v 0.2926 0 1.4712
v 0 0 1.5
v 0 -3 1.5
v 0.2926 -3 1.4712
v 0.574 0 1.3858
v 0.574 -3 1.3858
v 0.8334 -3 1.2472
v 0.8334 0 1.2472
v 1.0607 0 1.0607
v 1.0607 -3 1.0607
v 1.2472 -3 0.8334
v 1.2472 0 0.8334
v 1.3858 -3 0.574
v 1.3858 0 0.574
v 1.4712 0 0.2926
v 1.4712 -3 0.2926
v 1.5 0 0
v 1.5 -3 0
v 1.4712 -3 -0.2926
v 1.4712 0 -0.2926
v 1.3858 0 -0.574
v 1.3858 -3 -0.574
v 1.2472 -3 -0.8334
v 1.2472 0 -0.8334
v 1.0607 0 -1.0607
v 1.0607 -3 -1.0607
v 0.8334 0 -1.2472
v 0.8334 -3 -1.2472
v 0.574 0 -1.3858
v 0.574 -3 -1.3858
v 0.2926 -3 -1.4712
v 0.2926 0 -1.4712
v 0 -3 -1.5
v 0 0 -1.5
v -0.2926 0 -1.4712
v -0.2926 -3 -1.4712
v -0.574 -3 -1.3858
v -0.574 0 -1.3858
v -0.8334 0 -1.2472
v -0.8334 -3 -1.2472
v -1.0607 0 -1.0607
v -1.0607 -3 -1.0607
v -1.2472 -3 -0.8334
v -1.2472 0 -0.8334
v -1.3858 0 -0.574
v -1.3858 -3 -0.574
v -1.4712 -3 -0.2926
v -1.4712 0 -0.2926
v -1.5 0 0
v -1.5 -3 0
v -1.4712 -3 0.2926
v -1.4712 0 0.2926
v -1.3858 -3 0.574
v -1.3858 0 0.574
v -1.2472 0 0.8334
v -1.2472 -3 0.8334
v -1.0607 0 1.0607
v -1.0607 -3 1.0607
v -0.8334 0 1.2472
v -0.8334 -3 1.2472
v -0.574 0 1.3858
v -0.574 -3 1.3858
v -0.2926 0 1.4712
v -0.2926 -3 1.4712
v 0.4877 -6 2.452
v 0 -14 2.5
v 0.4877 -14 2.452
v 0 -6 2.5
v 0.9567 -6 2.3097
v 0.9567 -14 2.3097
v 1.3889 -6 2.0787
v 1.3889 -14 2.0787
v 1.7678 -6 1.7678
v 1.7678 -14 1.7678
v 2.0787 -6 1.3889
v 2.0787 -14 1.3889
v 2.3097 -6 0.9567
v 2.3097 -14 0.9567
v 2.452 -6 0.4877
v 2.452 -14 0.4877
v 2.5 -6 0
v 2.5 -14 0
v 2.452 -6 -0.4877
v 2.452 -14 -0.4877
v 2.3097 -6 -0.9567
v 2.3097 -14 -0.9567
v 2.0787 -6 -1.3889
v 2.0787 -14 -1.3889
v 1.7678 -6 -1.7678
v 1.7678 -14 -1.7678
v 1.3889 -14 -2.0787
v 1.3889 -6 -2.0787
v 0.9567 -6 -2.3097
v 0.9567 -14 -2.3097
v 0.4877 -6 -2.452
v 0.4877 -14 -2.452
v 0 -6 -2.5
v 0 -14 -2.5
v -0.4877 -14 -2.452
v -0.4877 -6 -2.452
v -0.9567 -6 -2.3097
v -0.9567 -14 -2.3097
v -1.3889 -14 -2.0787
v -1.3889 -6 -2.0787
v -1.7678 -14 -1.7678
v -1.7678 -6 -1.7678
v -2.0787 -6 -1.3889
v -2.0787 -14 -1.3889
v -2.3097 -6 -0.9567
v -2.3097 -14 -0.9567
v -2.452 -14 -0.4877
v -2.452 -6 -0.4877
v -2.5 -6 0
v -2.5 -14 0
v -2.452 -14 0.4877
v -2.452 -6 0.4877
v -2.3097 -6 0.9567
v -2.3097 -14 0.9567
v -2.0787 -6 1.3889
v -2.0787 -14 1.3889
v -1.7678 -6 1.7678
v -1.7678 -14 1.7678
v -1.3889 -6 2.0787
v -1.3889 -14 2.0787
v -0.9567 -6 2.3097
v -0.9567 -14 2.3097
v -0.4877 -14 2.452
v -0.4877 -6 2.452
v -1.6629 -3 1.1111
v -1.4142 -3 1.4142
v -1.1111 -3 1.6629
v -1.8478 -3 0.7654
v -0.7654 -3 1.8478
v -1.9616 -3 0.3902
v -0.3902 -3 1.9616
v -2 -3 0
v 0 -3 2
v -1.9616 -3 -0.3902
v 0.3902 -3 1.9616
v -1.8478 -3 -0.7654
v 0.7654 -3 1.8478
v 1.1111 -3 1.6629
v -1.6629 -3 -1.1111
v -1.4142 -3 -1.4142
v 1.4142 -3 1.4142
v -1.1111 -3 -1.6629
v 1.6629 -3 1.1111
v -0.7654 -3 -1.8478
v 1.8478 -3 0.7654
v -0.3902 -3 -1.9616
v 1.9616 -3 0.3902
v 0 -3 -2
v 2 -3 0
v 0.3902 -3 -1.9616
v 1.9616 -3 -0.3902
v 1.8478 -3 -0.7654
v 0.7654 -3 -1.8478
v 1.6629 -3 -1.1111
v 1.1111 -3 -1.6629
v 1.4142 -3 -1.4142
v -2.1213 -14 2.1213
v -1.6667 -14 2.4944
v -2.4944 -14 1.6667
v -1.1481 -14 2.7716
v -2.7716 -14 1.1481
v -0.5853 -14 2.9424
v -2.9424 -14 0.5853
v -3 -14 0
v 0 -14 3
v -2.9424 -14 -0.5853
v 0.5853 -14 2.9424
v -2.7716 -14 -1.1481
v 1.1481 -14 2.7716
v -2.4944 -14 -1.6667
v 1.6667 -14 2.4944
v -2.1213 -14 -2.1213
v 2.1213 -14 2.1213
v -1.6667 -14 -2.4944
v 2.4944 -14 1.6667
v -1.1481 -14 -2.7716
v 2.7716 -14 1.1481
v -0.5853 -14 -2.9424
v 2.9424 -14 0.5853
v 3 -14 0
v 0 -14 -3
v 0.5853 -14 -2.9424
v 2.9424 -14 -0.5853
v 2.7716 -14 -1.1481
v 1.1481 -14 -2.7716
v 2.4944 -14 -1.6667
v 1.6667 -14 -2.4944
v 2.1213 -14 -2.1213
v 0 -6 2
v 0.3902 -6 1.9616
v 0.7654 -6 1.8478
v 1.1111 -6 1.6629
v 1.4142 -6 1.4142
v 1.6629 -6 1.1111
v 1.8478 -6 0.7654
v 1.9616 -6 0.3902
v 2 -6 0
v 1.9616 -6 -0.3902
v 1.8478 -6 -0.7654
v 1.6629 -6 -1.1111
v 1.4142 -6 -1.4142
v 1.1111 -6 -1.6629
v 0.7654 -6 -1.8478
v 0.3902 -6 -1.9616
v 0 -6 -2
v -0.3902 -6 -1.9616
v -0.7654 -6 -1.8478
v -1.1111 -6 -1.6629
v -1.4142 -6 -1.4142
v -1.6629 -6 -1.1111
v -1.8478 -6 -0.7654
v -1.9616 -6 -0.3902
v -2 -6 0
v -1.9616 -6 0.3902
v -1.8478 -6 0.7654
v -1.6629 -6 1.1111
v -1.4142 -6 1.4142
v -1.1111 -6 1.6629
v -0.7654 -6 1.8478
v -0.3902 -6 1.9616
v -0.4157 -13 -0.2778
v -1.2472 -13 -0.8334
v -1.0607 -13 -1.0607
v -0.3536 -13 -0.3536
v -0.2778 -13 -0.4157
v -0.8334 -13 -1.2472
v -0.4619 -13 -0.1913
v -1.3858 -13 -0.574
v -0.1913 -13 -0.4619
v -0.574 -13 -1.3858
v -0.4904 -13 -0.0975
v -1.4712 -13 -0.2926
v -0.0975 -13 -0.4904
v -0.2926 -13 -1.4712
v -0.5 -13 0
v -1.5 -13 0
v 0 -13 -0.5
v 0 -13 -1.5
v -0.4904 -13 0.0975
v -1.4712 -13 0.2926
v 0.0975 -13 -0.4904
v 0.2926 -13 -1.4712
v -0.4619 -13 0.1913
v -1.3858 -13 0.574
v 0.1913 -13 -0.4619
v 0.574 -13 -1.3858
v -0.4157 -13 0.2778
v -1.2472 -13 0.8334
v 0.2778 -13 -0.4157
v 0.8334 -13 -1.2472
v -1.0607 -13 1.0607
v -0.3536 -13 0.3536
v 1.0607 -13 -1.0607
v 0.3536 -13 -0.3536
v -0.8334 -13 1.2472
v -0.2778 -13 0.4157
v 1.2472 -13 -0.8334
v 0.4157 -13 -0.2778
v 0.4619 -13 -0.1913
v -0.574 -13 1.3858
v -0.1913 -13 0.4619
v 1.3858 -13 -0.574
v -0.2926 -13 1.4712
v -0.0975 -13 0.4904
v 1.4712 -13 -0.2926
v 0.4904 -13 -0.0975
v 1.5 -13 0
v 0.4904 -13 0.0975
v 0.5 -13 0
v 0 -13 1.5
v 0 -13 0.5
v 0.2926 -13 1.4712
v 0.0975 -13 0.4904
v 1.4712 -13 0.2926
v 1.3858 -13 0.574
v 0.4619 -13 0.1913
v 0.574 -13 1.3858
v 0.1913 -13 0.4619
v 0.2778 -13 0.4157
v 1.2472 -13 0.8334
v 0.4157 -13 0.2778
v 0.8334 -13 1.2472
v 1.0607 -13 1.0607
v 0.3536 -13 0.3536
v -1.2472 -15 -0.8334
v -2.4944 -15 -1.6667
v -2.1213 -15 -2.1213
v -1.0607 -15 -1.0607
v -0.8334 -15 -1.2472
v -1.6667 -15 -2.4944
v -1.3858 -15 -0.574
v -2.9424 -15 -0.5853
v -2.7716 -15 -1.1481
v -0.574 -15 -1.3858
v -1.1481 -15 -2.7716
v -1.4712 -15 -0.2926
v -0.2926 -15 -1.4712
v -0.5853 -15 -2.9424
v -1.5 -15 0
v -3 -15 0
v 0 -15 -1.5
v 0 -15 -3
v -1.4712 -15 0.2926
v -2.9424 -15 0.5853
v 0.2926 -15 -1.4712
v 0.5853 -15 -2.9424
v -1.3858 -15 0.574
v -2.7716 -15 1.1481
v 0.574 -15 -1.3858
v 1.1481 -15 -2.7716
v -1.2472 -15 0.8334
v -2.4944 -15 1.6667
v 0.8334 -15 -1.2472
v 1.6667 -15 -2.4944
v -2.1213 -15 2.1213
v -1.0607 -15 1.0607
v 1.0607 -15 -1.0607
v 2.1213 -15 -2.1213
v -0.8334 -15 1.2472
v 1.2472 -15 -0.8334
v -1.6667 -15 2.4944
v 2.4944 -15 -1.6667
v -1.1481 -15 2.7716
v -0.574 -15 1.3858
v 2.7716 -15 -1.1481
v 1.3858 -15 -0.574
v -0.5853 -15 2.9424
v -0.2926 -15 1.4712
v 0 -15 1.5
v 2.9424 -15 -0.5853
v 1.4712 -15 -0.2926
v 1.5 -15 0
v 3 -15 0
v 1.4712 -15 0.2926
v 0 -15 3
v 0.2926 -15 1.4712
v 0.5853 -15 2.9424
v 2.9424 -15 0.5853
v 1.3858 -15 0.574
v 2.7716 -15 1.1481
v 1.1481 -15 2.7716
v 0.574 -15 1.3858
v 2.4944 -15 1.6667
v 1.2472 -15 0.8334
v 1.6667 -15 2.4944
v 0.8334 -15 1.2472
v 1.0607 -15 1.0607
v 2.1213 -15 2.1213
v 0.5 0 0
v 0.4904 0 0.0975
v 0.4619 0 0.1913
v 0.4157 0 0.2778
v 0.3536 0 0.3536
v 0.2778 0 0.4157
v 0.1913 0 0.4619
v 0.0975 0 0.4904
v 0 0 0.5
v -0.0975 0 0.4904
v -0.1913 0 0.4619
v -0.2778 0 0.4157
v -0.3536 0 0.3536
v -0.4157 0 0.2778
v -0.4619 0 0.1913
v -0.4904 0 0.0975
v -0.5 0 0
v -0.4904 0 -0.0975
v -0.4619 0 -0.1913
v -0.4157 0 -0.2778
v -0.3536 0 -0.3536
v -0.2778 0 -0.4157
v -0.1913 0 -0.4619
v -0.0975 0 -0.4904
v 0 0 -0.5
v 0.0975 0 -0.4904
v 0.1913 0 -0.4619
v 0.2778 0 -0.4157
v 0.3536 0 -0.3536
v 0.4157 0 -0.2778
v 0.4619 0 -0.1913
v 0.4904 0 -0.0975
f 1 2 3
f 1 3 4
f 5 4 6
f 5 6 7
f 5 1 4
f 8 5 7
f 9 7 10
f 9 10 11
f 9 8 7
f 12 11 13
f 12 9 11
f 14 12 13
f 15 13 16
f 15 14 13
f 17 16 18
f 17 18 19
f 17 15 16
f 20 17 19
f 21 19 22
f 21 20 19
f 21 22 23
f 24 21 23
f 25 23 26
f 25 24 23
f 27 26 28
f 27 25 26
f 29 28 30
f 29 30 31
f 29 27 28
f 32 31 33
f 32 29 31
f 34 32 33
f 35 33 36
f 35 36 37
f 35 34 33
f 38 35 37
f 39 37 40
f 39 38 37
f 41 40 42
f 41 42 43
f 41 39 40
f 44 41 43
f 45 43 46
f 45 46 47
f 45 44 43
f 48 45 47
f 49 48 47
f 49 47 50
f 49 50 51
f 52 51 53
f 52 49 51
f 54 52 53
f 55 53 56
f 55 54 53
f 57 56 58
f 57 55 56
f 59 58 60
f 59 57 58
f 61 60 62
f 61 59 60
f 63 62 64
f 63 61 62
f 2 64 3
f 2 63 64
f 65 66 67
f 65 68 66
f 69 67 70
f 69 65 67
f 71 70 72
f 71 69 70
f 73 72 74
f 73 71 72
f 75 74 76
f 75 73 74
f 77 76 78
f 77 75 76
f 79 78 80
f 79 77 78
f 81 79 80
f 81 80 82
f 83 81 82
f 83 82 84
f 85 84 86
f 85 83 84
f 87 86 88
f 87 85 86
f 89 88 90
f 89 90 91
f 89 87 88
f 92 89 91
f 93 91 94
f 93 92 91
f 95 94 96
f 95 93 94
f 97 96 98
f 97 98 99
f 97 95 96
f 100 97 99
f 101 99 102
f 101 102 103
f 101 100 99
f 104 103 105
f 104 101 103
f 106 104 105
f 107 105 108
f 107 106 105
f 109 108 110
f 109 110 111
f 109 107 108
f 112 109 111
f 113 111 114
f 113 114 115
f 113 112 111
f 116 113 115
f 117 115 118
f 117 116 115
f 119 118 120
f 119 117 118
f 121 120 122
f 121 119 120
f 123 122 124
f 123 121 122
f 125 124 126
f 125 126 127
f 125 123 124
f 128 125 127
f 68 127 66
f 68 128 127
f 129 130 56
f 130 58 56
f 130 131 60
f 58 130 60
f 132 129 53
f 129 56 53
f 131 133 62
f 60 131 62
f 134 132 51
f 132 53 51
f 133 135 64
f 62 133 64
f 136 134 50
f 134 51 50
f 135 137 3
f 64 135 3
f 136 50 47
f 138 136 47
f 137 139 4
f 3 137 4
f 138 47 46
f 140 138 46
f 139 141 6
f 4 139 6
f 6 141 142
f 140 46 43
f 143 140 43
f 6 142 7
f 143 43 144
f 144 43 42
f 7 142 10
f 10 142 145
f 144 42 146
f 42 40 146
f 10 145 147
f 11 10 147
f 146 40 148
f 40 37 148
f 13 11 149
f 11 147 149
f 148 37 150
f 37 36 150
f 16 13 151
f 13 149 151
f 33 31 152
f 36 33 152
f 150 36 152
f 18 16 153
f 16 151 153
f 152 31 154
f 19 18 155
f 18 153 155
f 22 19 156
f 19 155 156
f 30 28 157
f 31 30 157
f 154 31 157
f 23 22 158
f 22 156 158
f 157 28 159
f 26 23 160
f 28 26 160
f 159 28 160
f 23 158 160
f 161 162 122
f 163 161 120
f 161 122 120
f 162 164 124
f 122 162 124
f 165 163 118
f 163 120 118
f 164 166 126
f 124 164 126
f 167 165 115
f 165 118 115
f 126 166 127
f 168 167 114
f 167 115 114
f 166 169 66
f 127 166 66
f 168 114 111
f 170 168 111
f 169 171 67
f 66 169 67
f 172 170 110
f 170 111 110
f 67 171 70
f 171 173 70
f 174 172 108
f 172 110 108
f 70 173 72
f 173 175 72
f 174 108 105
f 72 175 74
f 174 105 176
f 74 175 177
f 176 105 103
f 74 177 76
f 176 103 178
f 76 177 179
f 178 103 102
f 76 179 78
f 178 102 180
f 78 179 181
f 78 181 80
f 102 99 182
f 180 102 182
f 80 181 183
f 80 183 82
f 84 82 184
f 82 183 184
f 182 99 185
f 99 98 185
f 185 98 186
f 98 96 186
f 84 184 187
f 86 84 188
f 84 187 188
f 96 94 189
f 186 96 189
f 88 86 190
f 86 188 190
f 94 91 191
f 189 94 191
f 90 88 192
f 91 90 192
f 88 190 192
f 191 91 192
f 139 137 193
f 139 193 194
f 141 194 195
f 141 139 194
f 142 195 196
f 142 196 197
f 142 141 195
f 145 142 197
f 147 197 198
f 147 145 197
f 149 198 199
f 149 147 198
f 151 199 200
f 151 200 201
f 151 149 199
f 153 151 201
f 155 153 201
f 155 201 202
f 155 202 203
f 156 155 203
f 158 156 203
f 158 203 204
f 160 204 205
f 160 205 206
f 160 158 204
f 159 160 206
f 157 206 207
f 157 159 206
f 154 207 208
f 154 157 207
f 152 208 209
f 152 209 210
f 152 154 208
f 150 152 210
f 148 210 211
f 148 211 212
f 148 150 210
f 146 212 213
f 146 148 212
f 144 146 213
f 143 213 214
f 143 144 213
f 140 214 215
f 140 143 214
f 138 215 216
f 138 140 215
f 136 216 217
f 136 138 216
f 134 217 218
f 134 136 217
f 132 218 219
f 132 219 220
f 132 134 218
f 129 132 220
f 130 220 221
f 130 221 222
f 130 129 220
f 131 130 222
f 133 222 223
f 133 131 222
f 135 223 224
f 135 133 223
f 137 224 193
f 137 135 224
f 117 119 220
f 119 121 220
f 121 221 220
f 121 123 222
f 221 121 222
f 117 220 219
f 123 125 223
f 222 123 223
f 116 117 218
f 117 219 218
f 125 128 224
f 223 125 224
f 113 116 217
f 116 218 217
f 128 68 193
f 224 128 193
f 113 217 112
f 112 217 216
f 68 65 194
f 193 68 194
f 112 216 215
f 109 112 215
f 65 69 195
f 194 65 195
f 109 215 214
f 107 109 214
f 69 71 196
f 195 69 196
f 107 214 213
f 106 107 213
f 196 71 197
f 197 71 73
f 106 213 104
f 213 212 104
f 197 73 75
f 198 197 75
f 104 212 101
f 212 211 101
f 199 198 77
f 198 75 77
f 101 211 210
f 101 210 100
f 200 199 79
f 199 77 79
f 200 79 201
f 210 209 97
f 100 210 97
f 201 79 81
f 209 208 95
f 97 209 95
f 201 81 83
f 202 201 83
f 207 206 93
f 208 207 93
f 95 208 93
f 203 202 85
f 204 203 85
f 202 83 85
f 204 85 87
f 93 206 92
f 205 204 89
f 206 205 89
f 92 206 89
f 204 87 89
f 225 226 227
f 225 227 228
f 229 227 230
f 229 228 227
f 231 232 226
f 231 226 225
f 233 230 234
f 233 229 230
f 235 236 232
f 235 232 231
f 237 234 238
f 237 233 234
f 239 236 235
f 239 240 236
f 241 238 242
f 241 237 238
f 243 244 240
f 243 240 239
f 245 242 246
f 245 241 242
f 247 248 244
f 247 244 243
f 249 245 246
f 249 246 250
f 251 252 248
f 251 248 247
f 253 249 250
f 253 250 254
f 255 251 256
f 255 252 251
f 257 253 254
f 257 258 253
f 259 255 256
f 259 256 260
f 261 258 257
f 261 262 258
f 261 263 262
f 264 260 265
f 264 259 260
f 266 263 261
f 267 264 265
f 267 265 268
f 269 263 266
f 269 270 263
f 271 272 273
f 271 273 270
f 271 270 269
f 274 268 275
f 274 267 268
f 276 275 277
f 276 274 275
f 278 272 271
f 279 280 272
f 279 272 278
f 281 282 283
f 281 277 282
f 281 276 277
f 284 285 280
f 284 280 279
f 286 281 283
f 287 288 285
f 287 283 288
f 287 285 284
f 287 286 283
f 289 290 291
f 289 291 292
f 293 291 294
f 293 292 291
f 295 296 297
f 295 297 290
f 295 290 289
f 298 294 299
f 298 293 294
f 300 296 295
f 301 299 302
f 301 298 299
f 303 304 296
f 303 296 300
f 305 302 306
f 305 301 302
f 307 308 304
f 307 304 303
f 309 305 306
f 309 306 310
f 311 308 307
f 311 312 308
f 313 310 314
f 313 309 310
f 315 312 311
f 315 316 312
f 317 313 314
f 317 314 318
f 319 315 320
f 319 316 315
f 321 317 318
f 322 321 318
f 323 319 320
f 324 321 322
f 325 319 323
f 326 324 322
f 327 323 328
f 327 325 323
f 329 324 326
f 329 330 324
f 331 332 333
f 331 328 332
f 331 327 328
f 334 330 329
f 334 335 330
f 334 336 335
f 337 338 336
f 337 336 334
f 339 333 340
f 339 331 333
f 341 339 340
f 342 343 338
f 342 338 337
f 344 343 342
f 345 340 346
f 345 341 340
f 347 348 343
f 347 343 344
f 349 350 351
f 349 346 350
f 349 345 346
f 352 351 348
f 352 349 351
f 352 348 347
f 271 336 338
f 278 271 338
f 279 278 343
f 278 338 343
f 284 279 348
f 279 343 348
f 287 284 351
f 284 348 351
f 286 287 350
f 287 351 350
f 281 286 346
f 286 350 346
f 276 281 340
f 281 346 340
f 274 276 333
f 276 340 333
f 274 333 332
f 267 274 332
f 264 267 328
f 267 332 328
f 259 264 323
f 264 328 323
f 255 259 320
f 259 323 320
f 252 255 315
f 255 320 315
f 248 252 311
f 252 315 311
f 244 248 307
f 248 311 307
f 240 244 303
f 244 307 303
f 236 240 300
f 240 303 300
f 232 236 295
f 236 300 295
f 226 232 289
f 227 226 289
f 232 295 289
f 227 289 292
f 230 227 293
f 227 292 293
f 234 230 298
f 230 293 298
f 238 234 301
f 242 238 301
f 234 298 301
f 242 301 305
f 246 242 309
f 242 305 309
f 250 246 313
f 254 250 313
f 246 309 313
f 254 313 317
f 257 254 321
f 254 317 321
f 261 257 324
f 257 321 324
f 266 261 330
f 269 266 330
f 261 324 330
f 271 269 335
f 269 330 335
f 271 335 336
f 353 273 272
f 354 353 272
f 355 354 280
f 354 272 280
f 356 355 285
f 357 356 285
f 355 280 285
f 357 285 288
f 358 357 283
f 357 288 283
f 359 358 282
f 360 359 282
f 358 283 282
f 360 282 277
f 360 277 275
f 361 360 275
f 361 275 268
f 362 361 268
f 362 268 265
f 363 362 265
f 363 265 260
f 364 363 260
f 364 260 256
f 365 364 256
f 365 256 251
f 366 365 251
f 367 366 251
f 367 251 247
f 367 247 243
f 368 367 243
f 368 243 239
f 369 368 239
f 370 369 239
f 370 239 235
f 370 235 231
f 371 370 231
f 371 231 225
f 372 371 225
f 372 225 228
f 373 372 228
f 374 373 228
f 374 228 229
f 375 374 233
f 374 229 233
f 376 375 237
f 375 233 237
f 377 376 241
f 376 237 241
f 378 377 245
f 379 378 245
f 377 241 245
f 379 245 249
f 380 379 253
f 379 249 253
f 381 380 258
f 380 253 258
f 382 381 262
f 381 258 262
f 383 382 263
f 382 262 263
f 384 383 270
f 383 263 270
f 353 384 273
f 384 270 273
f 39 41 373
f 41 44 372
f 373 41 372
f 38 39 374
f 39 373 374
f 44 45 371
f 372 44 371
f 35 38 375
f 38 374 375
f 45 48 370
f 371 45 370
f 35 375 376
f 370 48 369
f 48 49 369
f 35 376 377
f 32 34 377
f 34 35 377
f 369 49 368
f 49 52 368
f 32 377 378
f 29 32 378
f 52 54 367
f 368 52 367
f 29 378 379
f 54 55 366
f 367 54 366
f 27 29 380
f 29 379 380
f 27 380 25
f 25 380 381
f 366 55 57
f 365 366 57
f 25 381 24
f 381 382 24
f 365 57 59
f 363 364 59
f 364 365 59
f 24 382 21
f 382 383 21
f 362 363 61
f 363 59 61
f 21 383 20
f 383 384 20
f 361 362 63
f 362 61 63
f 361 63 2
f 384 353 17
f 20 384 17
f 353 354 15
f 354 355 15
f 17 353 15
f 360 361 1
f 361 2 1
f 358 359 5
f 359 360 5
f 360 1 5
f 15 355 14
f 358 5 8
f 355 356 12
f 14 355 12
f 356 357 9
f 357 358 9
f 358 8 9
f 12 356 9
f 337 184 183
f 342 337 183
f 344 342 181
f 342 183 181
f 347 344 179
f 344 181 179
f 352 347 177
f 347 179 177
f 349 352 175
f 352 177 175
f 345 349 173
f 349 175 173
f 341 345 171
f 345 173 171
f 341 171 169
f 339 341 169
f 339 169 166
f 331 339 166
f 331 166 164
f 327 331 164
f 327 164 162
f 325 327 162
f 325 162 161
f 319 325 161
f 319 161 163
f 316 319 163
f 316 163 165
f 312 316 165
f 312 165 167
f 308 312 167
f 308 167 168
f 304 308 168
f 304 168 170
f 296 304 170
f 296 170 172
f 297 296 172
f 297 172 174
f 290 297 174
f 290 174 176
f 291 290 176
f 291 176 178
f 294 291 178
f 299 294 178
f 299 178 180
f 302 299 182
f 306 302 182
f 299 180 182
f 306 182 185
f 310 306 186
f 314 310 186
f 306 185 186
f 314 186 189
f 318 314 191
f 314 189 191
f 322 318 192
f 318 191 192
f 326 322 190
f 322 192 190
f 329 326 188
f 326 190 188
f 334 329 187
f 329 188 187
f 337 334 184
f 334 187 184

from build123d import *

# Parameters (mm, degrees)
F0_R     = 3
F1_DEPTH = 15
F2_R     = 1.5
F3_DEPTH = 2
F4_W     = 5.878874
F4_H     = 2.213873
F6_R     = 0.5
F7_DEPTH = 13.001
F8_W     = 16.149964
F8_H     = 2.257945
F10_W    = 4.508098
F10_H    = 1.941308


with BuildPart() as f1:
    # F0 (on Front) → F1 (new body)
    with BuildSketch(Plane.XZ):
        Circle(F0_R)
    extrude(amount=F1_DEPTH)

    # F2 (on face) → F3 (cut)
    with BuildSketch(Plane.XZ.offset(15)):
        Circle(F2_R)
    extrude(amount=-F3_DEPTH, mode=Mode.SUBTRACT)

    # F4 (on Right) → F5 (revolve, cut)
    with BuildSketch(Plane.YZ):
        with Locations((-0.060563, 2.606936)):
            Rectangle(F4_W, F4_H)
    revolve(axis=Axis((0, -8.455116, 0), (0, 1, 0)), mode=Mode.SUBTRACT)

    # F6 (on face) → F7 (cut, through all)
    with BuildSketch(Plane.XZ.offset(13)):
        Circle(F6_R)
    extrude(amount=-F7_DEPTH, mode=Mode.SUBTRACT)

    # F8 (on Right) → F9 (revolve, cut)
    with BuildSketch(Plane.YZ):
        with Locations((-5.925018, 3.628972)):
            Rectangle(F8_W, F8_H)
    revolve(axis=Axis((0, -7.437502, 0), (0, 1, 0)), mode=Mode.SUBTRACT)

    # F10 (on Right) → F11 (revolve, cut)
    with BuildSketch(Plane.YZ):
        with Locations((-3.745951, 2.970654)):
            Rectangle(F10_W, F10_H)
    revolve(axis=Axis((0, -6.562206, 0), (0, 1, 0)), mode=Mode.SUBTRACT)


solid = f1.part
